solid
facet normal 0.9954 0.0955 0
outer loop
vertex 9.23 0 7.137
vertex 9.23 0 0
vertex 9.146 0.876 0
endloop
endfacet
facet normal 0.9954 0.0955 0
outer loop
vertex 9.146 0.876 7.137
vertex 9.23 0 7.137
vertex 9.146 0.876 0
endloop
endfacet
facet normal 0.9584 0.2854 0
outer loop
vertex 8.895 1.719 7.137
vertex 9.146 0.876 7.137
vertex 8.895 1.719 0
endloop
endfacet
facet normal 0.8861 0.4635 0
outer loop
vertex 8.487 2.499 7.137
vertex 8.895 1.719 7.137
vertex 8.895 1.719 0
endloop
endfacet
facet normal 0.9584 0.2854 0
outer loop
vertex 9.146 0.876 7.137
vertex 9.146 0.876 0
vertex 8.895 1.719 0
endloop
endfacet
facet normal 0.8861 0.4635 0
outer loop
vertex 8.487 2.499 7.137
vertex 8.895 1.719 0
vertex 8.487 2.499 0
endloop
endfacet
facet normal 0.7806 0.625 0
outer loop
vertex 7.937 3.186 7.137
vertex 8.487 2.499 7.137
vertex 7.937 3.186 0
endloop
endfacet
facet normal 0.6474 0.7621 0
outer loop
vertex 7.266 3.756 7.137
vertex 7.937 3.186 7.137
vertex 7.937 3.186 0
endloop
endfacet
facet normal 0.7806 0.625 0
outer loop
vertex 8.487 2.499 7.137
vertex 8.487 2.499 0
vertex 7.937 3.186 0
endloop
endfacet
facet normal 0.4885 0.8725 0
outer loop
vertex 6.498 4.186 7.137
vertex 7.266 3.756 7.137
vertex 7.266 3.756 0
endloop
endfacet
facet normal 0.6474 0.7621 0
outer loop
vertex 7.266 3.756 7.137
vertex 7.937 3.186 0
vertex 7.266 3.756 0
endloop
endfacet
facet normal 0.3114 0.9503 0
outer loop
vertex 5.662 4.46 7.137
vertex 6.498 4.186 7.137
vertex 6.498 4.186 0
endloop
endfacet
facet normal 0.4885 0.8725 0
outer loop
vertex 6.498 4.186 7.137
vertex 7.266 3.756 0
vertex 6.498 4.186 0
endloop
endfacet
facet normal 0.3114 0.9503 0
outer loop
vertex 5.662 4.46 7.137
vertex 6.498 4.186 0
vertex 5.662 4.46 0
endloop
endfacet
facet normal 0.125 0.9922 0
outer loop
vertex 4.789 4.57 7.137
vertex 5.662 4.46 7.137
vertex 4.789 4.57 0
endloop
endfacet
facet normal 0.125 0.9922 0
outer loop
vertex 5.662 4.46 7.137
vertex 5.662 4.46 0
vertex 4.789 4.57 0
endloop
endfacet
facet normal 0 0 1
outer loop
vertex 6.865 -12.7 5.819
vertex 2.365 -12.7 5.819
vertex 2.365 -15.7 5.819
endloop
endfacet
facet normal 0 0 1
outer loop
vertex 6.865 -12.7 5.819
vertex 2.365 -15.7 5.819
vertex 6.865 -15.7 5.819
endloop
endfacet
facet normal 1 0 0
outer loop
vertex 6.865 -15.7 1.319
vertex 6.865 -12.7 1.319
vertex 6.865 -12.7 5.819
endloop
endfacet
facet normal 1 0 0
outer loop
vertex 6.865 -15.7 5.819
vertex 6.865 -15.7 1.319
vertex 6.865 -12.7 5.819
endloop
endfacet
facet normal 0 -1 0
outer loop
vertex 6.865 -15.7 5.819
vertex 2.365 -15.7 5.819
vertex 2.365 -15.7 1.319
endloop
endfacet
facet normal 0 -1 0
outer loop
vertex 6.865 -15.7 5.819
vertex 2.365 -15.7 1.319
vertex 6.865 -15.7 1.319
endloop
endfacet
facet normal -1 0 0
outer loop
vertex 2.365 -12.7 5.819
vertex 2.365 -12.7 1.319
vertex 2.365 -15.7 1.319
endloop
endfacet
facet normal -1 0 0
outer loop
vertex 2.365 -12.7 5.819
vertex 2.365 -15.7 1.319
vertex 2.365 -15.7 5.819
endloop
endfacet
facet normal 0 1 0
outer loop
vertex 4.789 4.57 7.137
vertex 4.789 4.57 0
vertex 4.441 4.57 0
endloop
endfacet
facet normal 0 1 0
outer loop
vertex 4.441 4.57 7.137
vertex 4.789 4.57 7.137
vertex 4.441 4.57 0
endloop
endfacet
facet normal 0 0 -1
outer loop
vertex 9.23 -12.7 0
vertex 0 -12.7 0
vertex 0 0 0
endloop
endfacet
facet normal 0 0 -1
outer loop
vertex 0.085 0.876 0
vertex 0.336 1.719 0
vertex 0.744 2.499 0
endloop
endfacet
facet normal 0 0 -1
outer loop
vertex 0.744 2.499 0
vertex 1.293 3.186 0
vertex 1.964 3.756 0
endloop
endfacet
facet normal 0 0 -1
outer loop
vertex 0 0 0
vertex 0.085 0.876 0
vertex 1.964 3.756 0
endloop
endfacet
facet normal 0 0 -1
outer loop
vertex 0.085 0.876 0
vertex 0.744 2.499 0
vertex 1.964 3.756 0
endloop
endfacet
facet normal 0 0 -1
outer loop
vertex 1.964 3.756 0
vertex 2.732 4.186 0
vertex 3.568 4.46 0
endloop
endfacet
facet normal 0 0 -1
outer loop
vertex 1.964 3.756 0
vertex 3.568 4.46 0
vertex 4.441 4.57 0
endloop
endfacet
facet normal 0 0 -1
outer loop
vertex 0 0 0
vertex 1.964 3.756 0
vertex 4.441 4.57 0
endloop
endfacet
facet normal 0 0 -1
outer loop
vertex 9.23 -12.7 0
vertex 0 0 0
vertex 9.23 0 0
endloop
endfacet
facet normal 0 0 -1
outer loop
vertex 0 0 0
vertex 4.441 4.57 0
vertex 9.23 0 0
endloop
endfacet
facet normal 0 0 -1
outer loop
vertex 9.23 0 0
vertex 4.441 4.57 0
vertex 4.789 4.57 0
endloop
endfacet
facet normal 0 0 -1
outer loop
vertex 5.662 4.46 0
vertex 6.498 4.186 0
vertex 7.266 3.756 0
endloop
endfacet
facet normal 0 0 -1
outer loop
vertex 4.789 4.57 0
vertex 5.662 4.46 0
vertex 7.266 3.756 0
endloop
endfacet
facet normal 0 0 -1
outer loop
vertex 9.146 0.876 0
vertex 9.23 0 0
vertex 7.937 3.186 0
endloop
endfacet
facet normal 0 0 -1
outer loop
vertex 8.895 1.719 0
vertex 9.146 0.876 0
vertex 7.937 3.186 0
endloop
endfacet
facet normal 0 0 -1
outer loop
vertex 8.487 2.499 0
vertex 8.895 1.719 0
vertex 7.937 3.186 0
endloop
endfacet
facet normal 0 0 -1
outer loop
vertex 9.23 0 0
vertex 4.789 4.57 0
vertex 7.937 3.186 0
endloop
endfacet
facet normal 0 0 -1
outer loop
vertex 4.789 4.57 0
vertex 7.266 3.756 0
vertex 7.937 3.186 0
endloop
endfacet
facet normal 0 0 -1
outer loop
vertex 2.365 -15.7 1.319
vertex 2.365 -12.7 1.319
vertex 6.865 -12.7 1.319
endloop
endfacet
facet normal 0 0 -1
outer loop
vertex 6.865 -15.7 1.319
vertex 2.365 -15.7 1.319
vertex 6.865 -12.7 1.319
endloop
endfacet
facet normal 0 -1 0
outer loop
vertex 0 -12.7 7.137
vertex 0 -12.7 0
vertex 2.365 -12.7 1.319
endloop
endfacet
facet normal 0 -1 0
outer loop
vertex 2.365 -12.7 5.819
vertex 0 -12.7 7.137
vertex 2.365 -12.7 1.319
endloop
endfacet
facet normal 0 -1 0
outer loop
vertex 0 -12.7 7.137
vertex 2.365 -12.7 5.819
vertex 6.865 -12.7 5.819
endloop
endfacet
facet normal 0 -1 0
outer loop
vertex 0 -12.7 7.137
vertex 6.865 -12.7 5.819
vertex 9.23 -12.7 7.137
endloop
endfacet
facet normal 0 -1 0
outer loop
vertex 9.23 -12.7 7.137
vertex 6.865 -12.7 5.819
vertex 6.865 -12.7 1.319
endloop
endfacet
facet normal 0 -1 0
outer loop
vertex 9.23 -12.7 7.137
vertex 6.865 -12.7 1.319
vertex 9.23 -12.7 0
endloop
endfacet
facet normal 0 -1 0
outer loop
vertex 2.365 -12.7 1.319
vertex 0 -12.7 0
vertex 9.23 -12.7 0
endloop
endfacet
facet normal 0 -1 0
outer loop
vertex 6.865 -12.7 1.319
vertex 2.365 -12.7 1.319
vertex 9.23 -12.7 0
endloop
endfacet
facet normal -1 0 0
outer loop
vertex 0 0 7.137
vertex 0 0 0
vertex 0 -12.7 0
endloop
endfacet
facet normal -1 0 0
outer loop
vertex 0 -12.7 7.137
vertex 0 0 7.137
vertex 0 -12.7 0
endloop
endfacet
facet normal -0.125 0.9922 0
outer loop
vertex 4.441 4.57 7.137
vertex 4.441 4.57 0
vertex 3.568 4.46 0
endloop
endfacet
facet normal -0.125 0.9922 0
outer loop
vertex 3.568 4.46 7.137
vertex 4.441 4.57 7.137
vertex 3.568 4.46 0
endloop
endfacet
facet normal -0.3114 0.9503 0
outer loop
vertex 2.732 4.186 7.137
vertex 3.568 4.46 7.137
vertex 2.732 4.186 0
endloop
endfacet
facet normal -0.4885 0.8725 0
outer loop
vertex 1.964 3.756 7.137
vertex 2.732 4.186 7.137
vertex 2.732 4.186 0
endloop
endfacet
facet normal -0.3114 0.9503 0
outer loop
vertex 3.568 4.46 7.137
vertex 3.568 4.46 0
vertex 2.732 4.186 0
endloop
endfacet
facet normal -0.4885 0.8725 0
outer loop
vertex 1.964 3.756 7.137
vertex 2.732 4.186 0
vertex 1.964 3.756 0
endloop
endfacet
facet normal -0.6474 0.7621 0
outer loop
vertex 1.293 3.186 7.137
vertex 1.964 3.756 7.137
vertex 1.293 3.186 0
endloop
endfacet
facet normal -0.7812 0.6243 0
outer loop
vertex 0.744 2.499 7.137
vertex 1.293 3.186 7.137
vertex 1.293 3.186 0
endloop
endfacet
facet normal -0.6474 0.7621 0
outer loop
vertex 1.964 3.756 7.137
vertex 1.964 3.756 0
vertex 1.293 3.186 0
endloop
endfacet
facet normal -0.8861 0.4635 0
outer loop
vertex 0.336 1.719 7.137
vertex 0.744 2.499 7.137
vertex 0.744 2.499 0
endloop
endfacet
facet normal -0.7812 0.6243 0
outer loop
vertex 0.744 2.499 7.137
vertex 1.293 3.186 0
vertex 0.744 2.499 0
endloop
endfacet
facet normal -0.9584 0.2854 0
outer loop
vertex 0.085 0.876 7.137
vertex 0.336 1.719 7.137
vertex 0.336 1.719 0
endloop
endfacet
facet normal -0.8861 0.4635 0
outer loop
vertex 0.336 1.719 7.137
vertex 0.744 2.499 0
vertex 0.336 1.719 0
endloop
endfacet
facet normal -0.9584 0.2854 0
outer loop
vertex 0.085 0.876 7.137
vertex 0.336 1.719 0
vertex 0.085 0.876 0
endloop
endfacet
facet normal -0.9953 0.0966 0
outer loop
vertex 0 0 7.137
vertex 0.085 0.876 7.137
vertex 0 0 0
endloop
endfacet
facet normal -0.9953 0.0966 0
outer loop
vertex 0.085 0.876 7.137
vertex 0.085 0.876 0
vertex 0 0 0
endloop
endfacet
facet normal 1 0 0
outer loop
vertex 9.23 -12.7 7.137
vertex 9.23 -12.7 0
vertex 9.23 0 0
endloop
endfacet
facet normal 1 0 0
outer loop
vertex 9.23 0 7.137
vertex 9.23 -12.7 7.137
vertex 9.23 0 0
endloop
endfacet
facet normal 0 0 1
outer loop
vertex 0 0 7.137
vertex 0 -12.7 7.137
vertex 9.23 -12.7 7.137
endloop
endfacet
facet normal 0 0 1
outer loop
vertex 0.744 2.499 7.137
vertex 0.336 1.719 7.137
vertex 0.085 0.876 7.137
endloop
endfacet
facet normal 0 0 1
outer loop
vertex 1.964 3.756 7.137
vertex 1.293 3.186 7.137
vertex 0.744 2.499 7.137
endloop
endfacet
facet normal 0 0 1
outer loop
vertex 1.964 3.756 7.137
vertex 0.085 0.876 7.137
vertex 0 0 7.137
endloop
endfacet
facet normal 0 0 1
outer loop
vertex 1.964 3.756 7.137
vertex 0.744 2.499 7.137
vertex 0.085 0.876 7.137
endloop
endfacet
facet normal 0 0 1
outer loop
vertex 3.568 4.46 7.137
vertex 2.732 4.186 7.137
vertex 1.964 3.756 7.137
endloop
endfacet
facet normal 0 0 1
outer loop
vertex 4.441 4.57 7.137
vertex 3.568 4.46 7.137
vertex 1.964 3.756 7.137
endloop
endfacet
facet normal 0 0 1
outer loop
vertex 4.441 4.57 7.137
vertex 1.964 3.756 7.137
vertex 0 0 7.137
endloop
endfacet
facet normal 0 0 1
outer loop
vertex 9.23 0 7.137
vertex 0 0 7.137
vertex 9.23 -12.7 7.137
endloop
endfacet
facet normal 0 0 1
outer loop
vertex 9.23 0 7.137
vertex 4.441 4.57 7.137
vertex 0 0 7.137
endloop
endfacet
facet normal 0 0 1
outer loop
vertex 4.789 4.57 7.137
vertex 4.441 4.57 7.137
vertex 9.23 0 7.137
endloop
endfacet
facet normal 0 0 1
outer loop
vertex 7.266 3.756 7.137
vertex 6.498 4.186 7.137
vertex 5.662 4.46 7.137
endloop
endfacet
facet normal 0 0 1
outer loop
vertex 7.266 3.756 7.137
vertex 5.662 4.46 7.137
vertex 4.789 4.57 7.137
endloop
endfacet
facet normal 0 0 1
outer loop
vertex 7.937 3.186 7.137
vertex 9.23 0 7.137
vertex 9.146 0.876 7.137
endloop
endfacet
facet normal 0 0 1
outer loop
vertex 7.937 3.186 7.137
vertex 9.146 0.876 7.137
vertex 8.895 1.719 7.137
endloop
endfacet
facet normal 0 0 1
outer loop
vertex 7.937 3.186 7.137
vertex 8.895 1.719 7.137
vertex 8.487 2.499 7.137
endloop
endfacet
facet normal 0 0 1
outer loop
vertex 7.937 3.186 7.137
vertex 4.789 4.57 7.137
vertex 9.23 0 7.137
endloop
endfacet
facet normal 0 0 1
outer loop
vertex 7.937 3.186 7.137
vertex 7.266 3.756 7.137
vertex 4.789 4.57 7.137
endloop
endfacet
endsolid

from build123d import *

# Parameters (mm, degrees)
BOSS_EXTRUDE1_DEPTH = 7.1374
SKETCH2_W           = 4.5
SKETCH2_H           = 4.5
BOSS_EXTRUDE2_DEPTH = 3


with BuildPart() as part:
    # Sketch1 → Boss-Extrude1 (new body)
    with BuildSketch(Plane.XY):
        with BuildLine():
            Line((0, 0), (0, -12.7))
            Line((0, -12.7), (9.23036, -12.7))
            Line((9.23036, -12.7), (9.23036, 0))
            ThreePointArc((9.23036, 0), (7.937079259, 3.18640613), (4.788897173, 4.570136108))
            Line((4.788897173, 4.570136108), (4.441462827, 4.570136108))
            ThreePointArc((4.441462827, 4.570136108), (1.293280741, 3.18640613), (0, 0))
        make_face()
    extrude(amount=BOSS_EXTRUDE1_DEPTH)

    # Sketch2 → Boss-Extrude2 (add)
    with BuildSketch(Plane.XZ.offset(12.7)):
        with Locations((4.61518, 3.5687)):
            Rectangle(SKETCH2_W, SKETCH2_H)
    extrude(amount=BOSS_EXTRUDE2_DEPTH)


solid = part.part
